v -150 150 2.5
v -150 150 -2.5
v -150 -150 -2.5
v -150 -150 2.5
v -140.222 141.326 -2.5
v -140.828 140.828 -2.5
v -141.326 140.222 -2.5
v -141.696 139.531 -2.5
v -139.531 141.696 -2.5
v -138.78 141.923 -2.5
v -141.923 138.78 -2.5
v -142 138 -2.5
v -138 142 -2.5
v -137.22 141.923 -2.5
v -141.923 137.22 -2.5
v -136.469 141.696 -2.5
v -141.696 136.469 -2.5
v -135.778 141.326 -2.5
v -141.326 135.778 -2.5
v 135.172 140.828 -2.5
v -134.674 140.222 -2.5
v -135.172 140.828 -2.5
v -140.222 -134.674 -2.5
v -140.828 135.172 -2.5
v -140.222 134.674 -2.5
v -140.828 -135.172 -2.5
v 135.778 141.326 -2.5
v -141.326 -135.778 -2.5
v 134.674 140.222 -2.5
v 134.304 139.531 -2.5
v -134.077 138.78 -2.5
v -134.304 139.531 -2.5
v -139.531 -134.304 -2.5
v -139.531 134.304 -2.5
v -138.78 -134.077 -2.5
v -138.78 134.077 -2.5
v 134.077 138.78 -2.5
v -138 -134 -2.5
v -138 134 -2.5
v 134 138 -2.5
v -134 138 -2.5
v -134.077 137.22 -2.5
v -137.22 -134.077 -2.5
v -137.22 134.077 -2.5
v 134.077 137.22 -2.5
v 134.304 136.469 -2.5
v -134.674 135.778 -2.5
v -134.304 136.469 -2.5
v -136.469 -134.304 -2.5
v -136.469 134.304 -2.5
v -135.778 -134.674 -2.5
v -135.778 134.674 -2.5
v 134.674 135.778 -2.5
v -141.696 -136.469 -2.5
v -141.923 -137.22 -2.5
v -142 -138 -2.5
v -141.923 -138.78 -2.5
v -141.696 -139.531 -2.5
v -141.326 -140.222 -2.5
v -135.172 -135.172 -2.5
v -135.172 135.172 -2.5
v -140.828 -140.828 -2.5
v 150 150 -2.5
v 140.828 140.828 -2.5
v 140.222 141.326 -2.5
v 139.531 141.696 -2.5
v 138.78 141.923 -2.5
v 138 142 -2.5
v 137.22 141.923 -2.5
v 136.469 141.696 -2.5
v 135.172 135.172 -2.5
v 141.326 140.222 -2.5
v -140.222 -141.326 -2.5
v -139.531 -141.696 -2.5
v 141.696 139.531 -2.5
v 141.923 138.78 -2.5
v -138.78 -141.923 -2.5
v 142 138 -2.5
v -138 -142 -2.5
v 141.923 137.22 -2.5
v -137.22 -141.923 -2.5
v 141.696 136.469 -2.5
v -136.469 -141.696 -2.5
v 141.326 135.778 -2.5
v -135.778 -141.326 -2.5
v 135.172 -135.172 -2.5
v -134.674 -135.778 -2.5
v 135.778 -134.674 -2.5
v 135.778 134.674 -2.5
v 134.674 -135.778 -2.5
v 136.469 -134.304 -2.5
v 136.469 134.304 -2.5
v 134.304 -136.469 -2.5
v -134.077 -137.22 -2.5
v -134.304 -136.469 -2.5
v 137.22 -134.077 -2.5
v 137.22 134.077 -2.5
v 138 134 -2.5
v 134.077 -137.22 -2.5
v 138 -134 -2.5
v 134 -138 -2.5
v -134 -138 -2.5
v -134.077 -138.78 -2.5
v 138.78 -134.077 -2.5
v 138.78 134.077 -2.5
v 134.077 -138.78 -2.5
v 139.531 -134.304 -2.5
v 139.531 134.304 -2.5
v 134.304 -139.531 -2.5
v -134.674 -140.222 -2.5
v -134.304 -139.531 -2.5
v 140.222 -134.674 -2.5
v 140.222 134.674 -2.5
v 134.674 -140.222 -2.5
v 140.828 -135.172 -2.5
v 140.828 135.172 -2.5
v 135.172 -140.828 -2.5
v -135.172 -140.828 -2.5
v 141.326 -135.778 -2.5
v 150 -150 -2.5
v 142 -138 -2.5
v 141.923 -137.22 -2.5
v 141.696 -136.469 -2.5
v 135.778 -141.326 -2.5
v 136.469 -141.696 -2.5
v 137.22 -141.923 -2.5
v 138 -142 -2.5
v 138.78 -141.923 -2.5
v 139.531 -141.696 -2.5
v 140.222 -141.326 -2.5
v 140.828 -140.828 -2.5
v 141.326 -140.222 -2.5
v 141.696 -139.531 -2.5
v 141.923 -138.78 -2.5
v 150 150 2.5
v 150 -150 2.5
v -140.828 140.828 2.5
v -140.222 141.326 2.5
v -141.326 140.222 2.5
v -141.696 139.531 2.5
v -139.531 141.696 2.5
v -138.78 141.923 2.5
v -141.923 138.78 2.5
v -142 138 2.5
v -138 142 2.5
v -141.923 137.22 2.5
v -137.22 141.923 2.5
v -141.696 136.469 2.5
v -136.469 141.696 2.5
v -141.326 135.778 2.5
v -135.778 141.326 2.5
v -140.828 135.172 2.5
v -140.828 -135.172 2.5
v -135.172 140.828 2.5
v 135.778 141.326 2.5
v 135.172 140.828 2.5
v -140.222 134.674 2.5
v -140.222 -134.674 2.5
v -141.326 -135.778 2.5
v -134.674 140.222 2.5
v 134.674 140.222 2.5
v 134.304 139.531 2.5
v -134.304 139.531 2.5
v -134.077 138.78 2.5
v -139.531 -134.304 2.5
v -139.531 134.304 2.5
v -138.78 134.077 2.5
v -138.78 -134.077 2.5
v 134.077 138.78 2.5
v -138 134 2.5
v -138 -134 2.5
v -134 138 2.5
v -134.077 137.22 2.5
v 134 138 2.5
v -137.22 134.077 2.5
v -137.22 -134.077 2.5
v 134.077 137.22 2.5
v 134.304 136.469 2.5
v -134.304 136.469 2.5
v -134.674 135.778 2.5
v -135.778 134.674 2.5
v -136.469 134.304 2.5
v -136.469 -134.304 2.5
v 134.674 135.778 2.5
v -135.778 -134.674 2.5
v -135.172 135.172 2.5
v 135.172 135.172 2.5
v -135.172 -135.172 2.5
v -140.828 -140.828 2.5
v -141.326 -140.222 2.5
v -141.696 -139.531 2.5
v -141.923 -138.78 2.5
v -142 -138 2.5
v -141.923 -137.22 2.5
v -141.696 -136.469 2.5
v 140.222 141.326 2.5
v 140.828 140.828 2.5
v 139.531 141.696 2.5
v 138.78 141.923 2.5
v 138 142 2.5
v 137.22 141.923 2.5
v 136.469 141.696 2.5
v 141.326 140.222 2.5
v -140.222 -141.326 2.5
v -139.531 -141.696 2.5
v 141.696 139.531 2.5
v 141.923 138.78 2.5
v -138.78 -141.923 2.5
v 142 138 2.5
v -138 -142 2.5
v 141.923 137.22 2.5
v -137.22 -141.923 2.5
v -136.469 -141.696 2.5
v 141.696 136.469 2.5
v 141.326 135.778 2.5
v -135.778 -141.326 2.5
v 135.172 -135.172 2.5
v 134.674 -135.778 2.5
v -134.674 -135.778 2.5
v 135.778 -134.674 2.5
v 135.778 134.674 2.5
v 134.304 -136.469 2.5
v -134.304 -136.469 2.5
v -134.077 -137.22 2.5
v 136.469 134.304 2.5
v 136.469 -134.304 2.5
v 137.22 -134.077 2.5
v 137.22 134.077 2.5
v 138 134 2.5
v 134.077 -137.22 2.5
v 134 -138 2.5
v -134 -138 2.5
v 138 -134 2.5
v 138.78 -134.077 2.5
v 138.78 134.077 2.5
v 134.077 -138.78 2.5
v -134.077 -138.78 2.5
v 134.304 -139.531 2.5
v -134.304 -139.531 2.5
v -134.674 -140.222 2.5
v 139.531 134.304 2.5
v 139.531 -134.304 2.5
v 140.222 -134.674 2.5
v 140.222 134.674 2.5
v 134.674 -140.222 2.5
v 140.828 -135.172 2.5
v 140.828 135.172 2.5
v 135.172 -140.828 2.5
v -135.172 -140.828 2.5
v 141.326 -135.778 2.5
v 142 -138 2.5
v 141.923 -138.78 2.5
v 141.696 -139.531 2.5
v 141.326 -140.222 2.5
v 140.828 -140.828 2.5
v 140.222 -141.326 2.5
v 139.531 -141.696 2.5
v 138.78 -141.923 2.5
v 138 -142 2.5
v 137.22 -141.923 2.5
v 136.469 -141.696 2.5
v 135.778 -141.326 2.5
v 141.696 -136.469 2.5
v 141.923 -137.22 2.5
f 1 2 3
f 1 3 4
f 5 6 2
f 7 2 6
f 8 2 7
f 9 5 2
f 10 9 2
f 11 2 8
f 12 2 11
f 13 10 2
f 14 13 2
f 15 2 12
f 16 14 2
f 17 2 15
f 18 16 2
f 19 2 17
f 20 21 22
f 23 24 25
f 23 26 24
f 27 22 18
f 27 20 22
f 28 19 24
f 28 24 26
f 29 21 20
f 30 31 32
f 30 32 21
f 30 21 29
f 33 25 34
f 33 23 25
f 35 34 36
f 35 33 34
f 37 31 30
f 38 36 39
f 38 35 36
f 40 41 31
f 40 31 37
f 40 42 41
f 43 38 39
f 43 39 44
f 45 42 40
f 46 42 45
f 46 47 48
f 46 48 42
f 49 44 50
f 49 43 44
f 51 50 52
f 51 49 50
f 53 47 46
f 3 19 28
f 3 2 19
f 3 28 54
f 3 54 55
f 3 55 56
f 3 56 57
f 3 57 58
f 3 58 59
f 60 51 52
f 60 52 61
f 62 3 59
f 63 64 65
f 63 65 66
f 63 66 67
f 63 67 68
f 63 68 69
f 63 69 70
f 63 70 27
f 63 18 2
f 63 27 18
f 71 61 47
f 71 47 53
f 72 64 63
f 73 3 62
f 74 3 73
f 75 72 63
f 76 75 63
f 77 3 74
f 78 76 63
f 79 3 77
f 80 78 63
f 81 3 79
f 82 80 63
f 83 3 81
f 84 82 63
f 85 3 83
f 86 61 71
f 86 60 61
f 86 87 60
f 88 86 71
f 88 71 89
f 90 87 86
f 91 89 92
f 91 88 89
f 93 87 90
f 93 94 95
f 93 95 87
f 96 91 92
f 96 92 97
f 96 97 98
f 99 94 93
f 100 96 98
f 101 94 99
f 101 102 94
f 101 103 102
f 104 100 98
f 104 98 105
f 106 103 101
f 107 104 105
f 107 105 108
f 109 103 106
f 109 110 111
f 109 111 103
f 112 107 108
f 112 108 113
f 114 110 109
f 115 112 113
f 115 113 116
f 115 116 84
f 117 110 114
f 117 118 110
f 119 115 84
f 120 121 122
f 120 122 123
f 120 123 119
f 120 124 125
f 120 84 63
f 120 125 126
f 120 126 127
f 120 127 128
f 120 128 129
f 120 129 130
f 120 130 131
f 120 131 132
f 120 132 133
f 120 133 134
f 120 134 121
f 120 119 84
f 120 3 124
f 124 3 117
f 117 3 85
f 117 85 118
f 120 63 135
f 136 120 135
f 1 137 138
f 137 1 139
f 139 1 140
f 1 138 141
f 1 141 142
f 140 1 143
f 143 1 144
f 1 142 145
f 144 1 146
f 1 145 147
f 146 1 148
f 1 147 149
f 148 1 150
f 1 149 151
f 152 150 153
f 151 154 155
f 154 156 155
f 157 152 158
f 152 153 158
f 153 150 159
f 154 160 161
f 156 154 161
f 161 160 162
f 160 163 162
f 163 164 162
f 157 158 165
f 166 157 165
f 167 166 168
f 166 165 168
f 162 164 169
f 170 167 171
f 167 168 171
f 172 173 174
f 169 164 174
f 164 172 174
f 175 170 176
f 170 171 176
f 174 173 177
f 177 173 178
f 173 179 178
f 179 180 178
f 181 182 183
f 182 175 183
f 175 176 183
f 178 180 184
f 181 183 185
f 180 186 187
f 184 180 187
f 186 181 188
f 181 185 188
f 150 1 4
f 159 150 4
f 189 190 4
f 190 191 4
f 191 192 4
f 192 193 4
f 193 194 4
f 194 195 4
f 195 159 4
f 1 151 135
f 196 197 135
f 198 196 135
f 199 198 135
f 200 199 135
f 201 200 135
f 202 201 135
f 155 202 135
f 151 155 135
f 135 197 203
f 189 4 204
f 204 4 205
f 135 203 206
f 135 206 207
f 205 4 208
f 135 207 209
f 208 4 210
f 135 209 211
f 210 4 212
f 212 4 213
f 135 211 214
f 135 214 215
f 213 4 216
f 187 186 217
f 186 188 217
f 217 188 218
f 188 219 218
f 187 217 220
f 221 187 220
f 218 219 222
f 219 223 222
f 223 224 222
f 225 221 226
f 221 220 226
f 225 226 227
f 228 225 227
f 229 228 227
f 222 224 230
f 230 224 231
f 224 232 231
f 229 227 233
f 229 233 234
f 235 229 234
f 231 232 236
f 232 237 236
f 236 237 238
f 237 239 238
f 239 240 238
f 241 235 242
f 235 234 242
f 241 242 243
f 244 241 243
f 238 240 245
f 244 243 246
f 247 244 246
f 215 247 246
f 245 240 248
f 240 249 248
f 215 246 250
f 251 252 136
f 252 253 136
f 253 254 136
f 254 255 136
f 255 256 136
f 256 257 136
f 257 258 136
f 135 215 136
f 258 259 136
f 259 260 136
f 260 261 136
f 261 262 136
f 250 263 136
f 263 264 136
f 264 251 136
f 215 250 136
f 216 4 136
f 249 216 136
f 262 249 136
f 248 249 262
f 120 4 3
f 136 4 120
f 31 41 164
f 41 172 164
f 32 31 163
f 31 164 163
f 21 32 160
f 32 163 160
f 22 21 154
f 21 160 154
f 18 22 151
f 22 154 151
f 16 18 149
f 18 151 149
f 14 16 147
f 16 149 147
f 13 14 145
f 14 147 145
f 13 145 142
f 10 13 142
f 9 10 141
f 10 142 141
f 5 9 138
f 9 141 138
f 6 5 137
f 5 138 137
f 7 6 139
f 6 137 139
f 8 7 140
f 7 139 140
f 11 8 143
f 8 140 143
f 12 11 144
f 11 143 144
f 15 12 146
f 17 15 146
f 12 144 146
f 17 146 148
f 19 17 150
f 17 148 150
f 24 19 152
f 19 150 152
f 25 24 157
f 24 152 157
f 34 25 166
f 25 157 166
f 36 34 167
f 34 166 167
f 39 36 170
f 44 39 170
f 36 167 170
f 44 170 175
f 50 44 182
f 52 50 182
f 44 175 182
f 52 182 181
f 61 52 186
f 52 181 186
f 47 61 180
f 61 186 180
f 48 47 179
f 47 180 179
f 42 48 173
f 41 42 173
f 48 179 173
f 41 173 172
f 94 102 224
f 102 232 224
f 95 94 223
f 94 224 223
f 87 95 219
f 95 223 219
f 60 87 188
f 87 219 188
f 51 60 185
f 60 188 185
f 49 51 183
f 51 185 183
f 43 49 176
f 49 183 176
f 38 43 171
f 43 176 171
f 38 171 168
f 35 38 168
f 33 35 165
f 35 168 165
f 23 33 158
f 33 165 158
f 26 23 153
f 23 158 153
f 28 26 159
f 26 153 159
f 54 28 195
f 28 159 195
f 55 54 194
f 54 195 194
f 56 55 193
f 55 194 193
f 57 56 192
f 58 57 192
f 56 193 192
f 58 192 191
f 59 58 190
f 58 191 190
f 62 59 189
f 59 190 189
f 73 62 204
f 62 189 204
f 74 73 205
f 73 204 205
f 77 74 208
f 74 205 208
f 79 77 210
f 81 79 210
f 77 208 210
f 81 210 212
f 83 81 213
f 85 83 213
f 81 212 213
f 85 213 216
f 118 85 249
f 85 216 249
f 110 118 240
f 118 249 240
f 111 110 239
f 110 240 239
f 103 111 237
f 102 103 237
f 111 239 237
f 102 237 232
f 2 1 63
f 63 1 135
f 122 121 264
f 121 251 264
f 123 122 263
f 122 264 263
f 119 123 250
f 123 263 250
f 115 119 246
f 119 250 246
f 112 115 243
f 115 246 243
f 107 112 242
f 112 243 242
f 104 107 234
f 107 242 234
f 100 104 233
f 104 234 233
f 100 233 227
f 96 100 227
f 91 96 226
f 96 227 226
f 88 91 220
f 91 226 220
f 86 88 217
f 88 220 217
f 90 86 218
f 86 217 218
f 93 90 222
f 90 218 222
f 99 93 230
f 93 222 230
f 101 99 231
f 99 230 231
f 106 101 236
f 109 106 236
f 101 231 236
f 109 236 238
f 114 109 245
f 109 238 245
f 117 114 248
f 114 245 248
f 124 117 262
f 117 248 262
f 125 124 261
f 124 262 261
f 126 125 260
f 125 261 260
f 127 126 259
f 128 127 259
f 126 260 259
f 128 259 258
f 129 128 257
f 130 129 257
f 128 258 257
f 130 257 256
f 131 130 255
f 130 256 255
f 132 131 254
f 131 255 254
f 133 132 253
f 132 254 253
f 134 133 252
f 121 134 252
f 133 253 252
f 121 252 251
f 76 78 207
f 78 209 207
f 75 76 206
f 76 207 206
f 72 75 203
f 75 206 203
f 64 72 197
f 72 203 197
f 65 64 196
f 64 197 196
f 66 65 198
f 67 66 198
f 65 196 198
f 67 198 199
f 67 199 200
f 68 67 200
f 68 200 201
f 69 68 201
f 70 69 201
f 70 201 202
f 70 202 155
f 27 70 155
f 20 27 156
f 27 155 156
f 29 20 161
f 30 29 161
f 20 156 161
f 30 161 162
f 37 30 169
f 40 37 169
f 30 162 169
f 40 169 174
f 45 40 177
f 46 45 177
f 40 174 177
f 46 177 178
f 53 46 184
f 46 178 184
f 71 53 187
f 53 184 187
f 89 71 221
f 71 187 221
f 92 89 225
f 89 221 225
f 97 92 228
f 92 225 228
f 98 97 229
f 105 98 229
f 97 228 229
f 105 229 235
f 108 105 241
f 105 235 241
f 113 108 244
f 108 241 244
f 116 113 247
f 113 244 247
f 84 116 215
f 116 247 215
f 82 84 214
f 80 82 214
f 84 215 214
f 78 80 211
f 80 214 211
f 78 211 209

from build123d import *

# Parameters (mm, degrees)
F0_W     = 300
F0_H     = 5
F1_DEPTH = 150
F2_R     = 4
F3_DEPTH = 3


with BuildPart() as f1:
    # F0 (on Front) → F1 (new body, symmetric)
    with BuildSketch(Plane.XZ):
        Rectangle(F0_W, F0_H)
    extrude(amount=F1_DEPTH, both=True)

    # F2 (on Top) → F3 (cut, symmetric)
    with BuildSketch(Plane.XY):
        with Locations((138, -138)):
            Circle(F2_R)
        with Locations((-138, -138)):
            Circle(F2_R)
        with Locations((-138, 138)):
            Circle(F2_R)
        with Locations((138, 138)):
            Circle(F2_R)
    extrude(amount=F3_DEPTH, both=True, mode=Mode.SUBTRACT)


solid = f1.part
